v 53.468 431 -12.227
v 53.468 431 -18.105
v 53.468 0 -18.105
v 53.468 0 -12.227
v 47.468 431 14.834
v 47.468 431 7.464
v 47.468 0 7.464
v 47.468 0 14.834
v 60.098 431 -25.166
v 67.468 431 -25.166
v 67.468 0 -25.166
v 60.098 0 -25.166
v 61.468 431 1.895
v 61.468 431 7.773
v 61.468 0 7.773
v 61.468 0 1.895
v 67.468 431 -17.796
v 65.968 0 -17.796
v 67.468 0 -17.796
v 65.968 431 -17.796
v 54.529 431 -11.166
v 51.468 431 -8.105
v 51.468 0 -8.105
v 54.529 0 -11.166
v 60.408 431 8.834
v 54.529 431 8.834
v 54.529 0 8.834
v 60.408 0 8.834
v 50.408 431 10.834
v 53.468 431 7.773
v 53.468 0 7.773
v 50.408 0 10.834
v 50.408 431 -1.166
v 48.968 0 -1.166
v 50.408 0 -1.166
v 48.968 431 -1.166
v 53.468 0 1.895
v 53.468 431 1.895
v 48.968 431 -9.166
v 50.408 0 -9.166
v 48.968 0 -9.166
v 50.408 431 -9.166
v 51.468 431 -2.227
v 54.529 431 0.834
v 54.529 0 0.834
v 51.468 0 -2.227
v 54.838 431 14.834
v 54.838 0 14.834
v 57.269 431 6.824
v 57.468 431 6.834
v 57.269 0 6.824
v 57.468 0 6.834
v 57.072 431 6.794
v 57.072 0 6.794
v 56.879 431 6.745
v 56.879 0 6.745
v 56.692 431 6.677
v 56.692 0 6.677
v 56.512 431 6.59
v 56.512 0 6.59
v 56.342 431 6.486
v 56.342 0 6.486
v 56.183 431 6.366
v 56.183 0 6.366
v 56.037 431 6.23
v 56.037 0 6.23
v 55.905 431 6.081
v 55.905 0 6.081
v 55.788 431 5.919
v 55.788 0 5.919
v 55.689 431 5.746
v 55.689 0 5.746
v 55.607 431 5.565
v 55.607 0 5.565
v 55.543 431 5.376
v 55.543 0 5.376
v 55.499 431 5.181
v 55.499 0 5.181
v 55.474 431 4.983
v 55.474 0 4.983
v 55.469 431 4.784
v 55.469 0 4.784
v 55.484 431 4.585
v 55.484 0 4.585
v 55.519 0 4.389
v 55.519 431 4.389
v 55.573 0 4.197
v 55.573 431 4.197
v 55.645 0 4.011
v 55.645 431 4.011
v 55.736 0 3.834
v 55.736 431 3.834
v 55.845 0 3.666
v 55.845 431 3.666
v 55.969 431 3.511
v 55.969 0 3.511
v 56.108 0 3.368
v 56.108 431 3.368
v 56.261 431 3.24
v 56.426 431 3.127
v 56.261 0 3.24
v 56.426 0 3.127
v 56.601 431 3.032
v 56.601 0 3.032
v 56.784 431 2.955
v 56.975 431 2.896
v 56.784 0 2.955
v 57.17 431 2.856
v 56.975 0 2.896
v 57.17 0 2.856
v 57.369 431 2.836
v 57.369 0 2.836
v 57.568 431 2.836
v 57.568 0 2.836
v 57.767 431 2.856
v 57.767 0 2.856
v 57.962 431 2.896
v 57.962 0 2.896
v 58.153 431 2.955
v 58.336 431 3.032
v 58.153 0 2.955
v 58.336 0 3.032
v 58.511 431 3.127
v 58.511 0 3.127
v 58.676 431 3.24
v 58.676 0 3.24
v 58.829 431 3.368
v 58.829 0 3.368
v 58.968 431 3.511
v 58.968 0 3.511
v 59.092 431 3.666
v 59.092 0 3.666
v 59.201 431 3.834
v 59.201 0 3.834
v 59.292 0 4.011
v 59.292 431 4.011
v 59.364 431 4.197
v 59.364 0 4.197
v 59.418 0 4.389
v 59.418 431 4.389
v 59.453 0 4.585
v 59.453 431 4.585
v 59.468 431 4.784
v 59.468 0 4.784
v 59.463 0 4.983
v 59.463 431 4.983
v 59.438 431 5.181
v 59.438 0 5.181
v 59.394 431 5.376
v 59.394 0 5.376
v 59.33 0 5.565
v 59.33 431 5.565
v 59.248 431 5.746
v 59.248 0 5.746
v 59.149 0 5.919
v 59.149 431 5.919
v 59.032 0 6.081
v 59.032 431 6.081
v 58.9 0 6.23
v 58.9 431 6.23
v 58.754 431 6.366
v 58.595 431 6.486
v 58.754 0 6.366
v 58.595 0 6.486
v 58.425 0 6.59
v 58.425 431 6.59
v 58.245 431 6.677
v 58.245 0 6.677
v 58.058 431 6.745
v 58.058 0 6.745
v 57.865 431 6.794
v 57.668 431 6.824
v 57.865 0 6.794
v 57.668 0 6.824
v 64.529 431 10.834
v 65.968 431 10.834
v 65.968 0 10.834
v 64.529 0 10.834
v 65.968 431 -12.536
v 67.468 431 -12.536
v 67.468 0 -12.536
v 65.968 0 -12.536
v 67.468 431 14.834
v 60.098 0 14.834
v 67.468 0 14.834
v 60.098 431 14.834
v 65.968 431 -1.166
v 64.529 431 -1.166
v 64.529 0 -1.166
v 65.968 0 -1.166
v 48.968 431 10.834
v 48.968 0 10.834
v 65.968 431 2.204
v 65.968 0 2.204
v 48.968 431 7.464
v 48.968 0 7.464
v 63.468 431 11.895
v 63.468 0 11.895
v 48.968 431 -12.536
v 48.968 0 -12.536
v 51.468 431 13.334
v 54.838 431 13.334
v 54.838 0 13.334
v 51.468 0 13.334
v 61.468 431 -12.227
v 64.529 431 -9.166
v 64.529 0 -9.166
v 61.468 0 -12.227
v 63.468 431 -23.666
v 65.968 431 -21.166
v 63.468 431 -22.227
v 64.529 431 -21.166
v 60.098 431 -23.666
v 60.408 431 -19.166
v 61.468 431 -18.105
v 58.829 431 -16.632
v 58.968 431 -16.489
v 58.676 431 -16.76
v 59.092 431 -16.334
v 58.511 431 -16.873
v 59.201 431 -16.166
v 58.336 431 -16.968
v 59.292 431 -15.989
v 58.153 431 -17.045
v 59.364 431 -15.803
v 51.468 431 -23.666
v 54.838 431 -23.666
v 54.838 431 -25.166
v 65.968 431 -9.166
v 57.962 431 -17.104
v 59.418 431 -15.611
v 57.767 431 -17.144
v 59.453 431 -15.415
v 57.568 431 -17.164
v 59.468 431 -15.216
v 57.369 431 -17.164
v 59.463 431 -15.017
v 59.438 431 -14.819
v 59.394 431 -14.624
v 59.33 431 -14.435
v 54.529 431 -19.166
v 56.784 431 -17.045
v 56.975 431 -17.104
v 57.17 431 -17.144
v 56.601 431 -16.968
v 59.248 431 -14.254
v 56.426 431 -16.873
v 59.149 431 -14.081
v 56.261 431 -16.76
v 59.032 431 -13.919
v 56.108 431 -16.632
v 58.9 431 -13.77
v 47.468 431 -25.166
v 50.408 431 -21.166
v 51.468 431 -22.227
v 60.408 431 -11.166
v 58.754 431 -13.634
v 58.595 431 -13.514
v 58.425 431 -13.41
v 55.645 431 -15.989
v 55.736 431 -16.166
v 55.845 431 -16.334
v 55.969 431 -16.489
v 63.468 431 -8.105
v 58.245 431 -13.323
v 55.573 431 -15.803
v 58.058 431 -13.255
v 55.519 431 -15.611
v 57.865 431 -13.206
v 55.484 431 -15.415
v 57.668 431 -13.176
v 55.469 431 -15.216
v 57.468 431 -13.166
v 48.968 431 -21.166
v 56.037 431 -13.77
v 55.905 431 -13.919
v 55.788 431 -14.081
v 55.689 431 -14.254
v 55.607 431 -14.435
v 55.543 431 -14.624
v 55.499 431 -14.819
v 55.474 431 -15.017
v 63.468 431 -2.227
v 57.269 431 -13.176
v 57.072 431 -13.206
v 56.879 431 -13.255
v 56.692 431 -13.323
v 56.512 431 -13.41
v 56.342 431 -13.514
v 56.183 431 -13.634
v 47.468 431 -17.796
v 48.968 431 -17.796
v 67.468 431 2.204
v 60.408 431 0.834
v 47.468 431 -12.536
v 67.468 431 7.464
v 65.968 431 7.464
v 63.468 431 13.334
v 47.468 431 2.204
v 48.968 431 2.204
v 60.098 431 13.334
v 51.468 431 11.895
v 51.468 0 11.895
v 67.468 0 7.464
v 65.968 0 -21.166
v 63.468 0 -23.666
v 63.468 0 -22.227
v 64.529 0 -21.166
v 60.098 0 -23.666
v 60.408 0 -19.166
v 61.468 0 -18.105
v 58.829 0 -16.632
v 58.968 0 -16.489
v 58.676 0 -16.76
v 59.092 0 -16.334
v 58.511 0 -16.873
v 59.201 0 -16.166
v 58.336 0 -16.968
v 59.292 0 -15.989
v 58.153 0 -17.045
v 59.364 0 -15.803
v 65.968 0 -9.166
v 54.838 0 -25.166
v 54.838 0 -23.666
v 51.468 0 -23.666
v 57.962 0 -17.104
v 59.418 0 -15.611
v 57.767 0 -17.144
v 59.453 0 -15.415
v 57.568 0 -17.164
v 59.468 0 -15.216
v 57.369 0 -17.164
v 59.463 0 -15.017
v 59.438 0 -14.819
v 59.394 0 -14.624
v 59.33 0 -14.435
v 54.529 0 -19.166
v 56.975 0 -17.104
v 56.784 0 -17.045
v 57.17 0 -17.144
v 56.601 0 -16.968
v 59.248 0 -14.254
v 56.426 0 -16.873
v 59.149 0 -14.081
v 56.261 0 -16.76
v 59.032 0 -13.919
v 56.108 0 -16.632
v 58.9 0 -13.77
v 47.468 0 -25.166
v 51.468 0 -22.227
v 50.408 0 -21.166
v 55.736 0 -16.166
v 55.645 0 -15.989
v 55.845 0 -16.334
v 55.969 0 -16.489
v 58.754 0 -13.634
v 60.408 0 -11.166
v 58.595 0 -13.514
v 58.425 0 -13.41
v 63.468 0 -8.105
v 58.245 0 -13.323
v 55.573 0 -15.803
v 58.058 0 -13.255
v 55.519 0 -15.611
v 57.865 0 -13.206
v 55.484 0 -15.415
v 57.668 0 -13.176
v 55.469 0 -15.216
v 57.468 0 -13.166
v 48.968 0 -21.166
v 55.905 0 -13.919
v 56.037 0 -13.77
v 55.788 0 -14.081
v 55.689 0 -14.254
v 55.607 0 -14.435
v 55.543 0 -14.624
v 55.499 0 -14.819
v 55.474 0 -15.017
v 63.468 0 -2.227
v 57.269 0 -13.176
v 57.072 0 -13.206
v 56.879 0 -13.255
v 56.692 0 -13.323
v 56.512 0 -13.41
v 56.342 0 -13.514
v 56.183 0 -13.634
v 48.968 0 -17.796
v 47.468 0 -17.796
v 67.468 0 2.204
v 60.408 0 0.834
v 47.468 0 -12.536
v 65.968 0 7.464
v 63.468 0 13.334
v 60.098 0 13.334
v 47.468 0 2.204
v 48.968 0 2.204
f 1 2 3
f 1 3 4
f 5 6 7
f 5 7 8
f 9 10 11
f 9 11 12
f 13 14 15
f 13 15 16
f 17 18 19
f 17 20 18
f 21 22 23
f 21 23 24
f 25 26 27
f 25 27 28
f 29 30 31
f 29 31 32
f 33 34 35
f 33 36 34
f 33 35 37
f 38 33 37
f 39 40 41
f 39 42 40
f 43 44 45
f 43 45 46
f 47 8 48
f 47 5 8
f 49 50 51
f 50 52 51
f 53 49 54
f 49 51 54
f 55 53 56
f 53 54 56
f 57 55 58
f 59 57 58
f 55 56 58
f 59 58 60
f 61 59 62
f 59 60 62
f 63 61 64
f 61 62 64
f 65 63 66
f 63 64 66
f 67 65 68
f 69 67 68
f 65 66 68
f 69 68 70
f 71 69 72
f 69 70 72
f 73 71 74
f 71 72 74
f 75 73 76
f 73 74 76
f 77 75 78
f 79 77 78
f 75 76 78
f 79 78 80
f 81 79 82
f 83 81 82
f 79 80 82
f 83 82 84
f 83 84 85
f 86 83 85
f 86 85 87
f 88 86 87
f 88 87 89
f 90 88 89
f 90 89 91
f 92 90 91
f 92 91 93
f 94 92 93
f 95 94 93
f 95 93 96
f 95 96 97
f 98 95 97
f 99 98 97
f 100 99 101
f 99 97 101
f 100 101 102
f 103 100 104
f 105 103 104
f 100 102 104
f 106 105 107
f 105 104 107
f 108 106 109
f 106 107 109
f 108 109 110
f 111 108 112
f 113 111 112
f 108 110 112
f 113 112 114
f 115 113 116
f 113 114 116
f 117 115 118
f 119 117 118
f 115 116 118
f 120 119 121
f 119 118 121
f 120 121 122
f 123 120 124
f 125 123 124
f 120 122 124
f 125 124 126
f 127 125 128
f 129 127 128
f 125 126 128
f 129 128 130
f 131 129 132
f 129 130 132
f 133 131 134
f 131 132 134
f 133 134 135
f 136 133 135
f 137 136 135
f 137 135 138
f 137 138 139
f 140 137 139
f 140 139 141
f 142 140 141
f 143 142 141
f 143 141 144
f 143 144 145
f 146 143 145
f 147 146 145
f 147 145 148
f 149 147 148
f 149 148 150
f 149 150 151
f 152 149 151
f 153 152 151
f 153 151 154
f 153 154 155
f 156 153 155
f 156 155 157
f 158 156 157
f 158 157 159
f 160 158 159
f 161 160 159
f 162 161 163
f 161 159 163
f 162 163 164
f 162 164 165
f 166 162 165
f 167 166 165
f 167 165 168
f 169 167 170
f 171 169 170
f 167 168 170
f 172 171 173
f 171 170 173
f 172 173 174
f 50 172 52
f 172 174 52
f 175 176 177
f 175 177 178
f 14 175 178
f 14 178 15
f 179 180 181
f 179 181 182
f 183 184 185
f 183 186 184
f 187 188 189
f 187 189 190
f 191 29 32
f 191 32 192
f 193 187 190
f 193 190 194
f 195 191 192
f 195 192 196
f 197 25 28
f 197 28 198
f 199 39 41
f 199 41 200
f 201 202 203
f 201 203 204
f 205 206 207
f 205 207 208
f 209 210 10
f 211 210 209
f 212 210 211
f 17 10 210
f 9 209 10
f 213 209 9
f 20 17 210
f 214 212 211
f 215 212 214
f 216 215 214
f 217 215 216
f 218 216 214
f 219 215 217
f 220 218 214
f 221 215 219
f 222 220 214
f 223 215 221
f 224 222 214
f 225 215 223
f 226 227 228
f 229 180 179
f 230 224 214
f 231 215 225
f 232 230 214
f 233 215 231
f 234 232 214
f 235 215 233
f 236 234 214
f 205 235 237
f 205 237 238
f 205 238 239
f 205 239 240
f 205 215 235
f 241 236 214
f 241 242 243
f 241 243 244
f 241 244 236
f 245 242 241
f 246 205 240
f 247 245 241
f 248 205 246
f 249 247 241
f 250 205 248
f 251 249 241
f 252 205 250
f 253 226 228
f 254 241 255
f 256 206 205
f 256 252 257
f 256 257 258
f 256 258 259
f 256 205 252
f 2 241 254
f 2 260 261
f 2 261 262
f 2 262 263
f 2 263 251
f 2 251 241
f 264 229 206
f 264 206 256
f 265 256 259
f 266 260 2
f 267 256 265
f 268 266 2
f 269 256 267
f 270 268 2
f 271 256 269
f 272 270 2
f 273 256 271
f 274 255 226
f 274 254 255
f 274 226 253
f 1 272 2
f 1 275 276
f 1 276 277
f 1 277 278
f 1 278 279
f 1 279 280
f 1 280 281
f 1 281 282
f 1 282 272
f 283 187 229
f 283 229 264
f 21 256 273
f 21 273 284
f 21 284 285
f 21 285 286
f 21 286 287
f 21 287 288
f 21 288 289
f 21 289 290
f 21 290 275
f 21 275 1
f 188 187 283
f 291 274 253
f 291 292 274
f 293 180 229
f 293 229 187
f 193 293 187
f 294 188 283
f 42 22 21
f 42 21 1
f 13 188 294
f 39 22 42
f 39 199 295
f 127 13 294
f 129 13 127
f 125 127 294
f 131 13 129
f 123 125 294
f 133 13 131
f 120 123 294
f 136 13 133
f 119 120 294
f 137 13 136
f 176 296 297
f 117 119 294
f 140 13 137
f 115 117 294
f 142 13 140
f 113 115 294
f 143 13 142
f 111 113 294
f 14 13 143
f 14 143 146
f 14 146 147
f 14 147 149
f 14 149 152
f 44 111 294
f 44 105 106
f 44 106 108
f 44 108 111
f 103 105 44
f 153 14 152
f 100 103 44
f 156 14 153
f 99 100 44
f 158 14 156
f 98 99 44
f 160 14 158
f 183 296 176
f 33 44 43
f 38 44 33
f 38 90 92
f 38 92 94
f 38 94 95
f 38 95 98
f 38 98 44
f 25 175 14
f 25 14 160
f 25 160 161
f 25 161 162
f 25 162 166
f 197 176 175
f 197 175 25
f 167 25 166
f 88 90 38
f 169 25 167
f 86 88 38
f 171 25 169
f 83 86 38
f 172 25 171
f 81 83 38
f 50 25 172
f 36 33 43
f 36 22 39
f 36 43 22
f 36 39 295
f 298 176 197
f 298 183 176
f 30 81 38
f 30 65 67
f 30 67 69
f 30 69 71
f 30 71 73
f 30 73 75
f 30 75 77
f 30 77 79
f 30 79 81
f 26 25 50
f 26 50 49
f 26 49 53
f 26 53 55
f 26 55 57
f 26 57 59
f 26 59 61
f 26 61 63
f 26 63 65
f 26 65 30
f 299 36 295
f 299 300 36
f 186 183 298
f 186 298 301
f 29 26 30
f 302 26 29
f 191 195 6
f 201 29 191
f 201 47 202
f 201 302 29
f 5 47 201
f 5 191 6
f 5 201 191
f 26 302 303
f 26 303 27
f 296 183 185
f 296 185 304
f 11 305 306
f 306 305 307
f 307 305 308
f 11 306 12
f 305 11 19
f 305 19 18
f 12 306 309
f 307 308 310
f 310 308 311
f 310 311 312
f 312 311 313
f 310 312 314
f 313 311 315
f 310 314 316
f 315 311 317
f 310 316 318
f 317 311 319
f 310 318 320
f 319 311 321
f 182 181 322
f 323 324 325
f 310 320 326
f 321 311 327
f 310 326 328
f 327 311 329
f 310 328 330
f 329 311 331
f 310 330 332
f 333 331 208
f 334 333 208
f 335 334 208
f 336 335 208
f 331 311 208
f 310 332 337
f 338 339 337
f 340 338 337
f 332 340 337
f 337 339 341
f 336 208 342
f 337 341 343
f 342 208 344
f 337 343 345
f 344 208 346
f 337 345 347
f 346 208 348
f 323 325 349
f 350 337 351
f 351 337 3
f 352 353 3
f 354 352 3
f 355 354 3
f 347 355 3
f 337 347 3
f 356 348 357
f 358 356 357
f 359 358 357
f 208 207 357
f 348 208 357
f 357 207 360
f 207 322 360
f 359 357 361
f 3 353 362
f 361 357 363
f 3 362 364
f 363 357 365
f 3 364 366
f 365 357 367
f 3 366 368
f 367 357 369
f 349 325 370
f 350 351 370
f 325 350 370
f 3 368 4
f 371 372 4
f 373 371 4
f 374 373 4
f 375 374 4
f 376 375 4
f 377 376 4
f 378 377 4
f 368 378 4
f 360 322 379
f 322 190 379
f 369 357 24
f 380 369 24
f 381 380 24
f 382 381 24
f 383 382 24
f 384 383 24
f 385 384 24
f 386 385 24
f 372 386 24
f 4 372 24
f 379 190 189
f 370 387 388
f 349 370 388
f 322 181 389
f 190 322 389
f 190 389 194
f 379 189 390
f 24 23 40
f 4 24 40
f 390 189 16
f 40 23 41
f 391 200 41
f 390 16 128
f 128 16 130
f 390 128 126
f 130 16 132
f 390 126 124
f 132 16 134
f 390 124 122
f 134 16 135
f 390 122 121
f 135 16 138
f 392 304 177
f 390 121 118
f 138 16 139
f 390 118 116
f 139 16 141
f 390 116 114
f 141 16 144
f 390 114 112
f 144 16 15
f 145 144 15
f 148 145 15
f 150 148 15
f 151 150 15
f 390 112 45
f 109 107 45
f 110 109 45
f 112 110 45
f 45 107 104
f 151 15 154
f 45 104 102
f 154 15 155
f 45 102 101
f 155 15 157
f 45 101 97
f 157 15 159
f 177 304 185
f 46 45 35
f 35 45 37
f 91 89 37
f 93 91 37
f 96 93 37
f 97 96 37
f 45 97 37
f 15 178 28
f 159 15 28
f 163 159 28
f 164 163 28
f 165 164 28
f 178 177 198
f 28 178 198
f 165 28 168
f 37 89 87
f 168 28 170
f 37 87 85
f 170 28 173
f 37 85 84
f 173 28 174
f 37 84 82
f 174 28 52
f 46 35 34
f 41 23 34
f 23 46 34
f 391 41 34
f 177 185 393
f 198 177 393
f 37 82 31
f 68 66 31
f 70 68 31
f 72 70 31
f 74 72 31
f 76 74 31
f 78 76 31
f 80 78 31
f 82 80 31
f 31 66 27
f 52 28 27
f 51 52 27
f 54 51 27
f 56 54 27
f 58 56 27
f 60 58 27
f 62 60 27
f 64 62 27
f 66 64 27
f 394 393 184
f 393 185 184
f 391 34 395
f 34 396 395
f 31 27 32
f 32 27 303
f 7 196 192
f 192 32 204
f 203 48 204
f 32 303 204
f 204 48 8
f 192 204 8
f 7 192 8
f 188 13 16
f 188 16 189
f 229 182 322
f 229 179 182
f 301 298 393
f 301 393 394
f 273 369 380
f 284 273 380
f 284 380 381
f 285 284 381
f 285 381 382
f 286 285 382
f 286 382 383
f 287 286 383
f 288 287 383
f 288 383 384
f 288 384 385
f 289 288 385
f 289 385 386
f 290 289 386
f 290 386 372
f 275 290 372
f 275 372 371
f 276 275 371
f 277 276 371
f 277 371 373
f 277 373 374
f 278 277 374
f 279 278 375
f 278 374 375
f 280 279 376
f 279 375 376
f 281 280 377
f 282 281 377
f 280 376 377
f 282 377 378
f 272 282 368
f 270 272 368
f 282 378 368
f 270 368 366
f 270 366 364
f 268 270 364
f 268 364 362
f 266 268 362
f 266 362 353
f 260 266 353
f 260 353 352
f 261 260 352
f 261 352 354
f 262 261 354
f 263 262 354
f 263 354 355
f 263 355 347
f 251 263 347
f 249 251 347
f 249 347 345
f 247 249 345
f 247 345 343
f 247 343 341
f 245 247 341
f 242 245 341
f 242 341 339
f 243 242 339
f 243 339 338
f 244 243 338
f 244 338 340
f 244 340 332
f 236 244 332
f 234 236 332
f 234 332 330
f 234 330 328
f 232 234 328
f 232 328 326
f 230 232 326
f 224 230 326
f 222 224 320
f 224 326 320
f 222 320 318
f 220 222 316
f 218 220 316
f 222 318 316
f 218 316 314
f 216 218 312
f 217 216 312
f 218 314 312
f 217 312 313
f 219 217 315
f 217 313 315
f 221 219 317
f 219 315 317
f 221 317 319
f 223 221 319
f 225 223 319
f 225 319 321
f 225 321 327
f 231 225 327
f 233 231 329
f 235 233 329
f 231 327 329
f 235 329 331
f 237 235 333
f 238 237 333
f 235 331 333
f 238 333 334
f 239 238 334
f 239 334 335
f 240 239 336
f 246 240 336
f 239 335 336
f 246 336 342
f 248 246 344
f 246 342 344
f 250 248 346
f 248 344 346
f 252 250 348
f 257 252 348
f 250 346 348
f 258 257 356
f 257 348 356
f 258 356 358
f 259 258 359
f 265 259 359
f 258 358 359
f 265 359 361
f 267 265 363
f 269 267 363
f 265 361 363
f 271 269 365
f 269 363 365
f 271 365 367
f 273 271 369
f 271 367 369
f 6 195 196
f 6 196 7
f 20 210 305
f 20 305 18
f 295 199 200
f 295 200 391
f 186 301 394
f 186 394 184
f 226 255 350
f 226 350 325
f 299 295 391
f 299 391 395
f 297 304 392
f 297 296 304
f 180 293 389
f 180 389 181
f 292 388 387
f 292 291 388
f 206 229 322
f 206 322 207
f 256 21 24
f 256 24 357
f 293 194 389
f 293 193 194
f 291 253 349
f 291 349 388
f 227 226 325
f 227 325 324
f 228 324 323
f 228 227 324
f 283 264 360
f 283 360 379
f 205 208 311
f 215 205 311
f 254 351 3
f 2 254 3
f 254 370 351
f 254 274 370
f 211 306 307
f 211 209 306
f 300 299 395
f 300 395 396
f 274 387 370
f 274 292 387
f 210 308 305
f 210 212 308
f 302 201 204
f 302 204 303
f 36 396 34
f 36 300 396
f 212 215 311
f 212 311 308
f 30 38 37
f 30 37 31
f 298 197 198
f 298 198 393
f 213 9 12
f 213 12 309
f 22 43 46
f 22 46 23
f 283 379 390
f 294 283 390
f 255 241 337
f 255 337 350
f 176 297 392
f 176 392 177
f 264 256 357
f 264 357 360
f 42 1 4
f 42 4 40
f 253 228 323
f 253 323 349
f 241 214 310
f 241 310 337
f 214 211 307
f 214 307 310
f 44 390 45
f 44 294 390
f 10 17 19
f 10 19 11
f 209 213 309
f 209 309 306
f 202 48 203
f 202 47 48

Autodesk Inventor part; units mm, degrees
ref_plane "YZ Plane" through (0, 0, 0) normal (1, 0, 0) x (0, 1, 0)
ref_plane "XY Plane" through (0, 0, 0) normal (0, 0, 1) x (1, 0, 0)
ref_plane "Work Plane1" through (0, 431, 0) normal (0, 1, 0) x (-1, 0, 0)
sketch "Sketch1" plane through (0, 431, 0) normal (0, 1, 0) x (-1, 0, 0)
  line L0 (-54.5291, -19.1661) -> (-51.4685, -22.2268)
  line L1 (-67.4685, 2.2039) -> (-67.4685, -12.5361)
  line L2 (-51.4685, 11.8946) -> (-54.5291, 8.8339)
  line L3 (-48.9685, -9.1661) -> (-48.9685, -12.5361)
  line L4 (-64.5291, -1.1661) -> (-65.9685, -1.1661)
  line L5 (-54.8385, 14.8339) -> (-54.8385, 13.3339)
  line L6 (-63.4685, -23.6661) -> (-63.4685, -22.2268)
  line L7 (-53.4685, -18.1054) -> (-53.4685, -12.2268)
  line L8 (-67.4685, -25.1661) -> (-60.0985, -25.1661)
  line L9 (-48.9685, 7.4639) -> (-47.4685, 7.4639)
  line L10 (-63.4685, -2.2268) -> (-60.4078, 0.8339)
  line L11 (-48.9685, -17.7961) -> (-48.9685, -21.1661)
  line L12 (-64.5291, 10.8339) -> (-61.4685, 7.7732)
  line L13 (-53.4685, 7.7732) -> (-50.4078, 10.8339)
  line L14 (-54.5291, -11.1661) -> (-60.4078, -11.1661)
  line L15 (-65.9685, -21.1661) -> (-65.9685, -17.7961)
  line L16 (-67.4685, 7.4639) -> (-65.9685, 7.4639)
  line L17 (-60.0985, 13.3339) -> (-60.0985, 14.8339)
  line L18 (-61.4685, -12.2268) -> (-61.4685, -18.1054)
  line L19 (-47.4685, -25.1661) -> (-47.4685, -17.7961)
  line L20 (-48.9685, -1.1661) -> (-50.4078, -1.1661)
  line L21 (-47.4685, -12.5361) -> (-47.4685, 2.2039)
  line L22 (-51.4685, -23.6661) -> (-54.8385, -23.6661)
  line L23 (-65.9685, -12.5361) -> (-65.9685, -9.1661)
  line L24 (-60.4078, 8.8339) -> (-63.4685, 11.8946)
  line L25 (-50.4078, -9.1661) -> (-48.9685, -9.1661)
  line L26 (-51.4685, 13.3339) -> (-51.4685, 11.8946)
  line L27 (-60.4078, -19.1661) -> (-54.5291, -19.1661)
  line L28 (-65.9685, 2.2039) -> (-67.4685, 2.2039)
  line L29 (-50.4078, -21.1661) -> (-53.4685, -18.1054)
  line L30 (-47.4685, 14.8339) -> (-54.8385, 14.8339)
  line L31 (-61.4685, 1.8946) -> (-64.5291, -1.1661)
  line L32 (-54.5291, 0.8339) -> (-51.4685, -2.2268)
  line L33 (-60.0985, -23.6661) -> (-63.4685, -23.6661)
  line L34 (-67.4685, -17.7961) -> (-67.4685, -25.1661)
  line L35 (-65.9685, 10.8339) -> (-64.5291, 10.8339)
  line L36 (-47.4685, -17.7961) -> (-48.9685, -17.7961)
  line L37 (-48.9685, 10.8339) -> (-48.9685, 7.4639)
  line L38 (-63.4685, -8.1054) -> (-63.4685, -2.2268)
  line L39 (-53.4685, 1.8946) -> (-53.4685, 7.7732)
  line L40 (-51.4685, -8.1054) -> (-54.5291, -11.1661)
  line L41 (-67.4685, 14.8339) -> (-67.4685, 7.4639)
  line L42 (-64.5291, -21.1661) -> (-65.9685, -21.1661)
  line L43 (-54.8385, -25.1661) -> (-47.4685, -25.1661)
  line L44 (-63.4685, 13.3339) -> (-60.0985, 13.3339)
  line L45 (-48.9685, 2.2039) -> (-48.9685, -1.1661)
  line L46 (-64.5291, -9.1661) -> (-61.4685, -12.2268)
  line L47 (-51.4685, -22.2268) -> (-51.4685, -23.6661)
  line L48 (-48.9685, -12.5361) -> (-47.4685, -12.5361)
  line L49 (-67.4685, -12.5361) -> (-65.9685, -12.5361)
  line L50 (-54.5291, 8.8339) -> (-60.4078, 8.8339)
  line L51 (-65.9685, -1.1661) -> (-65.9685, 2.2039)
  line L52 (-53.4685, -12.2268) -> (-50.4078, -9.1661)
  line L53 (-54.8385, 13.3339) -> (-51.4685, 13.3339)
  line L54 (-63.4685, -22.2268) -> (-60.4078, -19.1661)
  line L55 (-47.4685, 7.4639) -> (-47.4685, 14.8339)
  line L56 (-60.4078, 0.8339) -> (-54.5291, 0.8339)
  line L57 (-48.9685, -21.1661) -> (-50.4078, -21.1661)
  line L58 (-61.4685, 7.7732) -> (-61.4685, 1.8946)
  line L59 (-60.0985, -25.1661) -> (-60.0985, -23.6661)
  line L60 (-60.4078, -11.1661) -> (-63.4685, -8.1054)
  line L61 (-65.9685, 7.4639) -> (-65.9685, 10.8339)
  line L62 (-50.4078, 10.8339) -> (-48.9685, 10.8339)
  line L63 (-65.9685, -17.7961) -> (-67.4685, -17.7961)
  line L64 (-50.4078, -1.1661) -> (-53.4685, 1.8946)
  line L65 (-61.4685, -18.1054) -> (-64.5291, -21.1661)
  line L66 (-51.4685, -2.2268) -> (-51.4685, -8.1054)
  line L67 (-60.0985, 14.8339) -> (-67.4685, 14.8339)
  line L68 (-54.8385, -23.6661) -> (-54.8385, -25.1661)
  line L69 (-63.4685, 11.8946) -> (-63.4685, 13.3339)
  line L70 (-65.9685, -9.1661) -> (-64.5291, -9.1661)
  line L71 (-47.4685, 2.2039) -> (-48.9685, 2.2039)
extrude "Extrusion1" add sketch "Sketch1" against normal blind 431
hole "Hole2" at (57.4685, 431, 4.8339) direction (0, -1, 0) diameter 4 depth 431
sketch "Sketch2" plane through (0, 431, 0) normal (0, 1, 0) x (-1, 0, 0)
  point P0 (-57.4685, 4.8339)
hole "Hole1" at (57.4685, 431, -15.1661) direction (0, -1, 0) diameter 4 depth 431
sketch "Sketch3" plane through (0, 431, 0) normal (0, 1, 0) x (-1, 0, 0)
  point P0 (-57.4685, -15.1661)
